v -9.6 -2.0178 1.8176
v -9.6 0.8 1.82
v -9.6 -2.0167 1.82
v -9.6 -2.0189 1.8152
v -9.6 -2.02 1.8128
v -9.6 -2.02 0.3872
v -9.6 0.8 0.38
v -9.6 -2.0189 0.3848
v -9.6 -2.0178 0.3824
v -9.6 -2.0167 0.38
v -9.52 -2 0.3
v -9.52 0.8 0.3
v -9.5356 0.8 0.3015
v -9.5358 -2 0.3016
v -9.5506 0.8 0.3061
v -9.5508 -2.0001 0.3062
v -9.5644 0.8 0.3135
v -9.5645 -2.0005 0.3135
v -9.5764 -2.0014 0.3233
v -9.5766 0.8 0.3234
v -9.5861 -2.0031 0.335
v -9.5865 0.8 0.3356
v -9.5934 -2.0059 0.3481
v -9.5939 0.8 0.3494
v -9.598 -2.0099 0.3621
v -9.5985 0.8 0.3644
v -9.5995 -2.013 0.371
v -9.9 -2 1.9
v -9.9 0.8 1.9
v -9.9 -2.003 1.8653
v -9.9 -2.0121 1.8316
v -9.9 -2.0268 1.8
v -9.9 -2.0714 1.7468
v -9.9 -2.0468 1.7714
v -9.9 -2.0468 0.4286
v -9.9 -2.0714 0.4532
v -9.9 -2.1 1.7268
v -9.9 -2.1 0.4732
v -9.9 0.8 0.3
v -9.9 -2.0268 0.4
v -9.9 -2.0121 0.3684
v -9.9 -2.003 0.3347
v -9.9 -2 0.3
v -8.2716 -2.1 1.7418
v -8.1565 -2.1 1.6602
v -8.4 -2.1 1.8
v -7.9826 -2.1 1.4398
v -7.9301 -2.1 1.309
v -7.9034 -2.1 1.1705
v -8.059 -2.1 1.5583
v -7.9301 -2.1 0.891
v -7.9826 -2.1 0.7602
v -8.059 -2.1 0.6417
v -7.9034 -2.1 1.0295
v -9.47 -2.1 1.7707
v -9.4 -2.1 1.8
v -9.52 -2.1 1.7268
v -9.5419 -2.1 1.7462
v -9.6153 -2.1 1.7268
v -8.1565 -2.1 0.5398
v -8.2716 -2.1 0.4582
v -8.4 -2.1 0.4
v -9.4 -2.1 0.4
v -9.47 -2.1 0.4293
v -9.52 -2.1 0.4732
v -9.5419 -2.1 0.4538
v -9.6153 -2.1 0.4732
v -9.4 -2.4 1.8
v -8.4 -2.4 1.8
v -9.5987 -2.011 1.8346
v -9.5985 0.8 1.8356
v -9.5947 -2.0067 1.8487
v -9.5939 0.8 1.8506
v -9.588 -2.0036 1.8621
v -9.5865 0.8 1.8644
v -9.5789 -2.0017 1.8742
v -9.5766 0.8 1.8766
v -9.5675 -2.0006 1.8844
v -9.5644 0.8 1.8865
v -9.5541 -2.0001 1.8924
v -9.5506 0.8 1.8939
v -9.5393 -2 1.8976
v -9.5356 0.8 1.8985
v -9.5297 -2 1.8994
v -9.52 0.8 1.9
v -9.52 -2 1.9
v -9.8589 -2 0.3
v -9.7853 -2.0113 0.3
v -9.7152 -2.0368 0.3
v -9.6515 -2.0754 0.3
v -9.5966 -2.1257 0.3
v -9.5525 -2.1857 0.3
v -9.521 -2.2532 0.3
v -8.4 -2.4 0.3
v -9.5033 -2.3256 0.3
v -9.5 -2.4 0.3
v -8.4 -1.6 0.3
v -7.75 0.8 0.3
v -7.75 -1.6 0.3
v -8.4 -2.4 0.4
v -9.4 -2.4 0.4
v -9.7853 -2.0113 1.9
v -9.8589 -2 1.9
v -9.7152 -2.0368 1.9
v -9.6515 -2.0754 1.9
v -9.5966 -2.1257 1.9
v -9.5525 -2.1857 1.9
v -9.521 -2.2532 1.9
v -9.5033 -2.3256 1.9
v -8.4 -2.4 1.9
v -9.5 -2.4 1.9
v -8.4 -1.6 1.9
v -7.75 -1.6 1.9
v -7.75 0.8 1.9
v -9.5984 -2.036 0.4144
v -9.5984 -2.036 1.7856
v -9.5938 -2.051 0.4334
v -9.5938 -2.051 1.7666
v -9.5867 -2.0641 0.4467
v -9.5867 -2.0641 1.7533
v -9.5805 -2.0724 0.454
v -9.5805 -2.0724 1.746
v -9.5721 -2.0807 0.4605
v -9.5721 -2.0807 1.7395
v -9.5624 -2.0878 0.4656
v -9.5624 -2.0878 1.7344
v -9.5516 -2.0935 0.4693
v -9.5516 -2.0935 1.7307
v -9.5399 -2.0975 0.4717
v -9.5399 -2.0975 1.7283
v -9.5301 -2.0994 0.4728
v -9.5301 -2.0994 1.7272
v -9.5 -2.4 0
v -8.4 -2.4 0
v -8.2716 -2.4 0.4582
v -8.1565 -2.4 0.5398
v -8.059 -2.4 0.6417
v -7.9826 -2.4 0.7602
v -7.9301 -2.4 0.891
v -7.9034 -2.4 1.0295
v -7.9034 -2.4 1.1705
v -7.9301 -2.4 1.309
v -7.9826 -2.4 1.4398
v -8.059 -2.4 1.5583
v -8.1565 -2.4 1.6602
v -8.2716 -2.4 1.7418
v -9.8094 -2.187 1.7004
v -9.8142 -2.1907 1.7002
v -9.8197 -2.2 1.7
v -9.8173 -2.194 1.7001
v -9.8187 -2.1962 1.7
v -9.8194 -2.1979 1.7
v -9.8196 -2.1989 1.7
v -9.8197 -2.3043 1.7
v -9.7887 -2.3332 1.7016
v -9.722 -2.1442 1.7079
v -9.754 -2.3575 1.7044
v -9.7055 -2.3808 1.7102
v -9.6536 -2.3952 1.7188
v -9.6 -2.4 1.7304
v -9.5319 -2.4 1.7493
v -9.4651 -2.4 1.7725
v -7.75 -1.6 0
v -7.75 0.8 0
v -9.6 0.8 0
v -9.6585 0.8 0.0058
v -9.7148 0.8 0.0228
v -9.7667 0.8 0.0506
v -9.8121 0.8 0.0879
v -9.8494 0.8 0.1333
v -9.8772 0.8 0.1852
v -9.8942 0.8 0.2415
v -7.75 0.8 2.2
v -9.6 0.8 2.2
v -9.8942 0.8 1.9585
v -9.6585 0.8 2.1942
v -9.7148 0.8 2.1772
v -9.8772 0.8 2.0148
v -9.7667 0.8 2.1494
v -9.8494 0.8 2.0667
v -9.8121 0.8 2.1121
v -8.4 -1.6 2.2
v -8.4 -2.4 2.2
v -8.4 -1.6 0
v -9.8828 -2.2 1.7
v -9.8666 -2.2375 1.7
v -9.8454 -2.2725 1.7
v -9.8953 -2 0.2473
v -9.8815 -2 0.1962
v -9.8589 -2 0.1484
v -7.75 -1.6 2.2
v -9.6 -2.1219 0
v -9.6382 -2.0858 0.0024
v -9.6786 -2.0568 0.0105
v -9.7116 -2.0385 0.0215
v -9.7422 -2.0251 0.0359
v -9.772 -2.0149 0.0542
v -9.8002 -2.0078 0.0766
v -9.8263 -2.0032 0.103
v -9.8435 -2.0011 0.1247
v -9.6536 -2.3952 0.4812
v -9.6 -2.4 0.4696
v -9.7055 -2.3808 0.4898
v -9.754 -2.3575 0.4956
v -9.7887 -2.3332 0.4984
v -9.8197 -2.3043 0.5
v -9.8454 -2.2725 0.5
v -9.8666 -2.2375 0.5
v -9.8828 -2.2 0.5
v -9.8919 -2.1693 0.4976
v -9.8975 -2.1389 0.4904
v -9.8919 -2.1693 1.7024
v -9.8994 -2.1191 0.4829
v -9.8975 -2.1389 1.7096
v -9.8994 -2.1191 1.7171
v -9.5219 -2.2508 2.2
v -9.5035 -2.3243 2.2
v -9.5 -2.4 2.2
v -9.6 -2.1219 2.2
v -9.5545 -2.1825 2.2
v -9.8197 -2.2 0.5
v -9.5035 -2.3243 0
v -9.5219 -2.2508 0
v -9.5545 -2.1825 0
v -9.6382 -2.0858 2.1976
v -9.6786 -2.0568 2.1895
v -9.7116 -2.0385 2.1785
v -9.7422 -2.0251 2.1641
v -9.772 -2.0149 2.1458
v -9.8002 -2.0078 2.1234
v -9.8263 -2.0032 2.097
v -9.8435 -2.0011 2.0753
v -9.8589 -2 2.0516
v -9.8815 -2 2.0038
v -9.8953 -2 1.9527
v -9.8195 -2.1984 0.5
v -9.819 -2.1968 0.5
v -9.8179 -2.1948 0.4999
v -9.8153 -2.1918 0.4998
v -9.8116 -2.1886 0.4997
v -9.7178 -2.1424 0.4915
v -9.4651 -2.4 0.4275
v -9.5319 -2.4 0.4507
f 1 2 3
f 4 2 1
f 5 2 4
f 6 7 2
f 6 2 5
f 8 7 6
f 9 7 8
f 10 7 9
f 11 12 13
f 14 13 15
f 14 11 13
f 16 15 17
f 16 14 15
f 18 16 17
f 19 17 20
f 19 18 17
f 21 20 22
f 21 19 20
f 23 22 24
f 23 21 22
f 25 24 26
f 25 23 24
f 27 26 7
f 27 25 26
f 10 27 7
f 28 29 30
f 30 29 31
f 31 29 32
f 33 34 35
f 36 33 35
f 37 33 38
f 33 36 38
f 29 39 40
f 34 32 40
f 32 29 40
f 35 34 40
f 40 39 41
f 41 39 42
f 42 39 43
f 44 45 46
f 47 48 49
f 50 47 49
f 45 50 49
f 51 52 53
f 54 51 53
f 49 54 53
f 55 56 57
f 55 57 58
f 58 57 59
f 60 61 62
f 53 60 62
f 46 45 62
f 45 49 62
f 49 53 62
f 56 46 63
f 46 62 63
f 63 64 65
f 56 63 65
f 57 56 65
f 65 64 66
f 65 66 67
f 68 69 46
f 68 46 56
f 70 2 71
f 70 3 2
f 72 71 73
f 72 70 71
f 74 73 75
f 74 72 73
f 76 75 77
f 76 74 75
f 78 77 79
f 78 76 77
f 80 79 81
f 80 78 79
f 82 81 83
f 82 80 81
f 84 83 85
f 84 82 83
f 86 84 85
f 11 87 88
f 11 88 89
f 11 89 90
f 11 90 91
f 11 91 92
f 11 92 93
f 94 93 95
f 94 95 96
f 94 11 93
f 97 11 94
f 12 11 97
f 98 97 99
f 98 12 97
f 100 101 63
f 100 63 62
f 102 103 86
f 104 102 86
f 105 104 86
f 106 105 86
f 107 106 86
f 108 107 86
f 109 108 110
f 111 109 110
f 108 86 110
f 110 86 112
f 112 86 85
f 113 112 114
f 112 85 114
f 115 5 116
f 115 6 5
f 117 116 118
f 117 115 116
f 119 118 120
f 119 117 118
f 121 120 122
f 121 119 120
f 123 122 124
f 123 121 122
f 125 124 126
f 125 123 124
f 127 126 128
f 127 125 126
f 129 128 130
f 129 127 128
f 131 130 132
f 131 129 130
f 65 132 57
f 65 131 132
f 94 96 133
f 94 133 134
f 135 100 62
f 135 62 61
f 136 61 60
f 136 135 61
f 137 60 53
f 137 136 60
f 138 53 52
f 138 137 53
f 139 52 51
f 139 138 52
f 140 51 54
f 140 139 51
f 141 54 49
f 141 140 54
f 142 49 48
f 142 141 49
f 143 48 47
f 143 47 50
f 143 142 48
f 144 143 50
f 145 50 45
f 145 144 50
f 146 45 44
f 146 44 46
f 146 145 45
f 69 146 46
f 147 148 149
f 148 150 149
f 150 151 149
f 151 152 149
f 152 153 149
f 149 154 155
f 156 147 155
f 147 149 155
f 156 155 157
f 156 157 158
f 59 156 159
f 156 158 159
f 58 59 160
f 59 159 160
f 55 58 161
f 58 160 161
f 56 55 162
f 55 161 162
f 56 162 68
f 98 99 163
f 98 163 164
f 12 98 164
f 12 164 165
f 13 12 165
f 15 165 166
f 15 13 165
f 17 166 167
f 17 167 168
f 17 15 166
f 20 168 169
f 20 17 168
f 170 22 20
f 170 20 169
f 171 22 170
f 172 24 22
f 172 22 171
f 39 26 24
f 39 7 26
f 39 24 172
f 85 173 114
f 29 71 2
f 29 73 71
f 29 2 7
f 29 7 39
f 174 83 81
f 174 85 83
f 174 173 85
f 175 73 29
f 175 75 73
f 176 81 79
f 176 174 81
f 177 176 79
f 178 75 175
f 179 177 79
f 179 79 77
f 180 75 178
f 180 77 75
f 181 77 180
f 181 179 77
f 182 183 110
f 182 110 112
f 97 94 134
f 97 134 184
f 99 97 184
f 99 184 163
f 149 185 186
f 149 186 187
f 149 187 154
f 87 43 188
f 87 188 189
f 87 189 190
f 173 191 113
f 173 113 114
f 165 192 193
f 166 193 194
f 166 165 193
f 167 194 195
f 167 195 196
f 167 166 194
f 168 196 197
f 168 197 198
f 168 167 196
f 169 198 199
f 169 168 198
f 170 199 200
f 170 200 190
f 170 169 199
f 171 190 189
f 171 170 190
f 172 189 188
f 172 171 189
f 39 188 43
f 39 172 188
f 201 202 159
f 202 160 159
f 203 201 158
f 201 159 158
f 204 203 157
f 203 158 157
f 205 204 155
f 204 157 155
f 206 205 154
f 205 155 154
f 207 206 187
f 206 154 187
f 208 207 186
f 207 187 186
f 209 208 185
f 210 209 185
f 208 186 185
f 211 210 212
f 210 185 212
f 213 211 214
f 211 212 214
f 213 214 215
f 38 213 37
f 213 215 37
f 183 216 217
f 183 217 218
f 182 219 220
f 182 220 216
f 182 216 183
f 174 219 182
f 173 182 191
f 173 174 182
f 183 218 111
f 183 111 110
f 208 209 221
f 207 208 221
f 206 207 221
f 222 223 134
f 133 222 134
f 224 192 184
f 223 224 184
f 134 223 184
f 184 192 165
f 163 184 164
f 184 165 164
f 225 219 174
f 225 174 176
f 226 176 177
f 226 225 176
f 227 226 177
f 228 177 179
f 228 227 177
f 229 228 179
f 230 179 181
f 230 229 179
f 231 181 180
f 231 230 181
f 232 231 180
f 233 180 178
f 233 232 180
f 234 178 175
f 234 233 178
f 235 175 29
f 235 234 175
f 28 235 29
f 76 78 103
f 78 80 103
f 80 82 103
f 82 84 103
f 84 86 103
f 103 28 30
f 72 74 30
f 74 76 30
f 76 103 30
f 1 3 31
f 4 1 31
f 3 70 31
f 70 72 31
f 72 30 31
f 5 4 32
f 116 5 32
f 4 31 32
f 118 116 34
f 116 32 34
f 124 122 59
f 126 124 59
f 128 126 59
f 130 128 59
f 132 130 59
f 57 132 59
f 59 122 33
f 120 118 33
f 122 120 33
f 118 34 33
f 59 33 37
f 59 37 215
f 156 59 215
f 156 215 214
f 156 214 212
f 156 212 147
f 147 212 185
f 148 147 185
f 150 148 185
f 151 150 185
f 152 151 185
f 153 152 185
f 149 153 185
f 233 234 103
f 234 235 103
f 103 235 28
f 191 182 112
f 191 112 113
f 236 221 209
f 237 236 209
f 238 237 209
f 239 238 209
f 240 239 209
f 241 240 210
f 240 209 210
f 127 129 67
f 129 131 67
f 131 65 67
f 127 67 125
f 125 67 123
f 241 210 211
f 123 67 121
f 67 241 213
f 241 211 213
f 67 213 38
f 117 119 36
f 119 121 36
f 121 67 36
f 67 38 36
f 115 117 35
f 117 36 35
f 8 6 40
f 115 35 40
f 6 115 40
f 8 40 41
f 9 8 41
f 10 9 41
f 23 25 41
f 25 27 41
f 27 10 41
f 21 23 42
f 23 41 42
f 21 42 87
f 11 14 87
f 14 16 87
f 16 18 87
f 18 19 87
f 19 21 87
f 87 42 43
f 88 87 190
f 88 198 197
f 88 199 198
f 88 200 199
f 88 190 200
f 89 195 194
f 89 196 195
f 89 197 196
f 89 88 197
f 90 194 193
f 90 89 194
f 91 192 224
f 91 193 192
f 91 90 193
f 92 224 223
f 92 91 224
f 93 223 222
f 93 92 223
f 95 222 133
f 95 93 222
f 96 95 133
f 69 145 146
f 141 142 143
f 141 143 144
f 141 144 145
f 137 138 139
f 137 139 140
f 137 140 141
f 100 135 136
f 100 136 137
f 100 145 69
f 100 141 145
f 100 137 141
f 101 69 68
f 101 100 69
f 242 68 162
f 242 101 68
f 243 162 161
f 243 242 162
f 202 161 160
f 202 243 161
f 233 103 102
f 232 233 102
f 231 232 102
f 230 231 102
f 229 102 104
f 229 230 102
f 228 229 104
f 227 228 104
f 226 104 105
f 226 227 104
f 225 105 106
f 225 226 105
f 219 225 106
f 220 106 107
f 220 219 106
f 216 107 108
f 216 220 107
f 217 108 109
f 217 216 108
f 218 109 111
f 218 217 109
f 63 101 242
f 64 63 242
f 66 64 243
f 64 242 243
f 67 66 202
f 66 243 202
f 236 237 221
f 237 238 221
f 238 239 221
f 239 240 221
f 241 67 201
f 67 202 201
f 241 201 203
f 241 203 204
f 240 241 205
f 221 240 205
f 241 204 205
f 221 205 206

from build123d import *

# Parameters (mm, degrees)
PAD020_DEPTH              = 0.3
PAD019_DEPTH              = 0.3
PAD021_DEPTH              = 0.3
PAD018_DEPTH              = 0.3
FILLET004_R               = 0.3
FILLET005_R               = 0.08
FILLET005_PLACEMENT_ANGLE = 180


with BuildPart() as body020:
    # Sketch019 → Pad020 (new body)
    with BuildSketch(Plane.XZ.offset(2.4)):
        with BuildLine():
            Line((9.4, 1.8), (8.4, 1.8))
            ThreePointArc((8.4, 1.8), (7.9, 1.1), (8.4, 0.4))
            Line((8.4, 0.4), (9.4, 0.4))
            ThreePointArc((9.9, 0.5), (9.644126, 0.479372), (9.4, 0.4))
            Line((9.9, 0.5), (9.9, 1.7))
            ThreePointArc((9.4, 1.8), (9.644126, 1.720628), (9.9, 1.7))
        make_face()
    extrude(amount=-PAD020_DEPTH)


with BuildPart() as body021:
    # Sketch021 → Pad019 (new body)
    with BuildSketch(Plane.XY):
        with BuildLine():
            Line((9.5, -2.4), (8.4, -2.4))
            Line((8.4, -2.4), (8.4, -1.6))
            Line((8.4, -1.6), (7.75, -1.6))
            Line((7.75, -1.6), (7.75, 0.8))
            Line((7.75, 0.8), (9.9, 0.8))
            Line((9.9, 0.8), (9.9, -2))
            ThreePointArc((9.9, -2), (9.610743, -2.110743), (9.5, -2.4))
        make_face()
    extrude(amount=PAD019_DEPTH)


with BuildPart() as body019:
    # Sketch020 → Pad021 (new body)
    with BuildSketch(Plane.XY.offset(1.9)):
        with BuildLine():
            Line((9.5, -2.4), (8.4, -2.4))
            Line((8.4, -2.4), (8.4, -1.6))
            Line((8.4, -1.6), (7.75, -1.6))
            Line((7.75, -1.6), (7.75, 0.8))
            Line((7.75, 0.8), (9.9, 0.8))
            Line((9.9, 0.8), (9.9, -2))
            ThreePointArc((9.9, -2), (9.610743, -2.110743), (9.5, -2.4))
        make_face()
    extrude(amount=PAD021_DEPTH)


with BuildPart() as fillet005:
    # Sketch018 → Pad018 (new body)
    with BuildSketch(Plane.YZ.offset(9.9)):
        with BuildLine():
            Line((0.8, 2.2), (0.8, 0))
            Line((0.8, 0), (-2, 0))
            Line((-2, 0), (-2, 0.3))
            ThreePointArc((-2, 0.3), (-2.058579, 0.441421), (-2.2, 0.5))
            Line((-2.2, 0.5), (-2.4, 0.5))
            Line((-2.4, 1.7), (-2.4, 0.5))
            Line((-2.2, 1.7), (-2.4, 1.7))
            ThreePointArc((-2.2, 1.7), (-2.058579, 1.758579), (-2, 1.9))
            Line((-2, 1.9), (-2, 2.2))
            Line((-2, 2.2), (0.8, 2.2))
        make_face()
    extrude(amount=-PAD018_DEPTH)

    # Fusion003: union Body020, Body021, Body019
    add(body020.part)
    add(body021.part)
    add(body019.part)

    # Fillet004
    fillet004_edges = [fillet005.edges().sort_by_distance(p)[0] for p in [
        (9.9, -2.4, 1.1),
        (9.9, -0.6, 0),
        (9.9, -0.6, 2.2),
    ]]
    fillet(fillet004_edges, radius=FILLET004_R)

    # Fillet005
    fillet005_edges = [fillet005.edges().sort_by_distance(p)[0] for p in [
        (9.6, -2.1, 1.1),
        (9.6, -0.6, 0.3),
        (9.6, -0.6, 1.9),
    ]]
    fillet(fillet005_edges, radius=FILLET005_R)


with BuildPart() as fillet005_1:
    # Fillet005 placement: moved
    add(fillet005.part.moved(Location((0, 0, 2.2))).rotate(Axis((0, 0, 2.2), (0, 1, 0)), FILLET005_PLACEMENT_ANGLE))


solid = fillet005_1.part
